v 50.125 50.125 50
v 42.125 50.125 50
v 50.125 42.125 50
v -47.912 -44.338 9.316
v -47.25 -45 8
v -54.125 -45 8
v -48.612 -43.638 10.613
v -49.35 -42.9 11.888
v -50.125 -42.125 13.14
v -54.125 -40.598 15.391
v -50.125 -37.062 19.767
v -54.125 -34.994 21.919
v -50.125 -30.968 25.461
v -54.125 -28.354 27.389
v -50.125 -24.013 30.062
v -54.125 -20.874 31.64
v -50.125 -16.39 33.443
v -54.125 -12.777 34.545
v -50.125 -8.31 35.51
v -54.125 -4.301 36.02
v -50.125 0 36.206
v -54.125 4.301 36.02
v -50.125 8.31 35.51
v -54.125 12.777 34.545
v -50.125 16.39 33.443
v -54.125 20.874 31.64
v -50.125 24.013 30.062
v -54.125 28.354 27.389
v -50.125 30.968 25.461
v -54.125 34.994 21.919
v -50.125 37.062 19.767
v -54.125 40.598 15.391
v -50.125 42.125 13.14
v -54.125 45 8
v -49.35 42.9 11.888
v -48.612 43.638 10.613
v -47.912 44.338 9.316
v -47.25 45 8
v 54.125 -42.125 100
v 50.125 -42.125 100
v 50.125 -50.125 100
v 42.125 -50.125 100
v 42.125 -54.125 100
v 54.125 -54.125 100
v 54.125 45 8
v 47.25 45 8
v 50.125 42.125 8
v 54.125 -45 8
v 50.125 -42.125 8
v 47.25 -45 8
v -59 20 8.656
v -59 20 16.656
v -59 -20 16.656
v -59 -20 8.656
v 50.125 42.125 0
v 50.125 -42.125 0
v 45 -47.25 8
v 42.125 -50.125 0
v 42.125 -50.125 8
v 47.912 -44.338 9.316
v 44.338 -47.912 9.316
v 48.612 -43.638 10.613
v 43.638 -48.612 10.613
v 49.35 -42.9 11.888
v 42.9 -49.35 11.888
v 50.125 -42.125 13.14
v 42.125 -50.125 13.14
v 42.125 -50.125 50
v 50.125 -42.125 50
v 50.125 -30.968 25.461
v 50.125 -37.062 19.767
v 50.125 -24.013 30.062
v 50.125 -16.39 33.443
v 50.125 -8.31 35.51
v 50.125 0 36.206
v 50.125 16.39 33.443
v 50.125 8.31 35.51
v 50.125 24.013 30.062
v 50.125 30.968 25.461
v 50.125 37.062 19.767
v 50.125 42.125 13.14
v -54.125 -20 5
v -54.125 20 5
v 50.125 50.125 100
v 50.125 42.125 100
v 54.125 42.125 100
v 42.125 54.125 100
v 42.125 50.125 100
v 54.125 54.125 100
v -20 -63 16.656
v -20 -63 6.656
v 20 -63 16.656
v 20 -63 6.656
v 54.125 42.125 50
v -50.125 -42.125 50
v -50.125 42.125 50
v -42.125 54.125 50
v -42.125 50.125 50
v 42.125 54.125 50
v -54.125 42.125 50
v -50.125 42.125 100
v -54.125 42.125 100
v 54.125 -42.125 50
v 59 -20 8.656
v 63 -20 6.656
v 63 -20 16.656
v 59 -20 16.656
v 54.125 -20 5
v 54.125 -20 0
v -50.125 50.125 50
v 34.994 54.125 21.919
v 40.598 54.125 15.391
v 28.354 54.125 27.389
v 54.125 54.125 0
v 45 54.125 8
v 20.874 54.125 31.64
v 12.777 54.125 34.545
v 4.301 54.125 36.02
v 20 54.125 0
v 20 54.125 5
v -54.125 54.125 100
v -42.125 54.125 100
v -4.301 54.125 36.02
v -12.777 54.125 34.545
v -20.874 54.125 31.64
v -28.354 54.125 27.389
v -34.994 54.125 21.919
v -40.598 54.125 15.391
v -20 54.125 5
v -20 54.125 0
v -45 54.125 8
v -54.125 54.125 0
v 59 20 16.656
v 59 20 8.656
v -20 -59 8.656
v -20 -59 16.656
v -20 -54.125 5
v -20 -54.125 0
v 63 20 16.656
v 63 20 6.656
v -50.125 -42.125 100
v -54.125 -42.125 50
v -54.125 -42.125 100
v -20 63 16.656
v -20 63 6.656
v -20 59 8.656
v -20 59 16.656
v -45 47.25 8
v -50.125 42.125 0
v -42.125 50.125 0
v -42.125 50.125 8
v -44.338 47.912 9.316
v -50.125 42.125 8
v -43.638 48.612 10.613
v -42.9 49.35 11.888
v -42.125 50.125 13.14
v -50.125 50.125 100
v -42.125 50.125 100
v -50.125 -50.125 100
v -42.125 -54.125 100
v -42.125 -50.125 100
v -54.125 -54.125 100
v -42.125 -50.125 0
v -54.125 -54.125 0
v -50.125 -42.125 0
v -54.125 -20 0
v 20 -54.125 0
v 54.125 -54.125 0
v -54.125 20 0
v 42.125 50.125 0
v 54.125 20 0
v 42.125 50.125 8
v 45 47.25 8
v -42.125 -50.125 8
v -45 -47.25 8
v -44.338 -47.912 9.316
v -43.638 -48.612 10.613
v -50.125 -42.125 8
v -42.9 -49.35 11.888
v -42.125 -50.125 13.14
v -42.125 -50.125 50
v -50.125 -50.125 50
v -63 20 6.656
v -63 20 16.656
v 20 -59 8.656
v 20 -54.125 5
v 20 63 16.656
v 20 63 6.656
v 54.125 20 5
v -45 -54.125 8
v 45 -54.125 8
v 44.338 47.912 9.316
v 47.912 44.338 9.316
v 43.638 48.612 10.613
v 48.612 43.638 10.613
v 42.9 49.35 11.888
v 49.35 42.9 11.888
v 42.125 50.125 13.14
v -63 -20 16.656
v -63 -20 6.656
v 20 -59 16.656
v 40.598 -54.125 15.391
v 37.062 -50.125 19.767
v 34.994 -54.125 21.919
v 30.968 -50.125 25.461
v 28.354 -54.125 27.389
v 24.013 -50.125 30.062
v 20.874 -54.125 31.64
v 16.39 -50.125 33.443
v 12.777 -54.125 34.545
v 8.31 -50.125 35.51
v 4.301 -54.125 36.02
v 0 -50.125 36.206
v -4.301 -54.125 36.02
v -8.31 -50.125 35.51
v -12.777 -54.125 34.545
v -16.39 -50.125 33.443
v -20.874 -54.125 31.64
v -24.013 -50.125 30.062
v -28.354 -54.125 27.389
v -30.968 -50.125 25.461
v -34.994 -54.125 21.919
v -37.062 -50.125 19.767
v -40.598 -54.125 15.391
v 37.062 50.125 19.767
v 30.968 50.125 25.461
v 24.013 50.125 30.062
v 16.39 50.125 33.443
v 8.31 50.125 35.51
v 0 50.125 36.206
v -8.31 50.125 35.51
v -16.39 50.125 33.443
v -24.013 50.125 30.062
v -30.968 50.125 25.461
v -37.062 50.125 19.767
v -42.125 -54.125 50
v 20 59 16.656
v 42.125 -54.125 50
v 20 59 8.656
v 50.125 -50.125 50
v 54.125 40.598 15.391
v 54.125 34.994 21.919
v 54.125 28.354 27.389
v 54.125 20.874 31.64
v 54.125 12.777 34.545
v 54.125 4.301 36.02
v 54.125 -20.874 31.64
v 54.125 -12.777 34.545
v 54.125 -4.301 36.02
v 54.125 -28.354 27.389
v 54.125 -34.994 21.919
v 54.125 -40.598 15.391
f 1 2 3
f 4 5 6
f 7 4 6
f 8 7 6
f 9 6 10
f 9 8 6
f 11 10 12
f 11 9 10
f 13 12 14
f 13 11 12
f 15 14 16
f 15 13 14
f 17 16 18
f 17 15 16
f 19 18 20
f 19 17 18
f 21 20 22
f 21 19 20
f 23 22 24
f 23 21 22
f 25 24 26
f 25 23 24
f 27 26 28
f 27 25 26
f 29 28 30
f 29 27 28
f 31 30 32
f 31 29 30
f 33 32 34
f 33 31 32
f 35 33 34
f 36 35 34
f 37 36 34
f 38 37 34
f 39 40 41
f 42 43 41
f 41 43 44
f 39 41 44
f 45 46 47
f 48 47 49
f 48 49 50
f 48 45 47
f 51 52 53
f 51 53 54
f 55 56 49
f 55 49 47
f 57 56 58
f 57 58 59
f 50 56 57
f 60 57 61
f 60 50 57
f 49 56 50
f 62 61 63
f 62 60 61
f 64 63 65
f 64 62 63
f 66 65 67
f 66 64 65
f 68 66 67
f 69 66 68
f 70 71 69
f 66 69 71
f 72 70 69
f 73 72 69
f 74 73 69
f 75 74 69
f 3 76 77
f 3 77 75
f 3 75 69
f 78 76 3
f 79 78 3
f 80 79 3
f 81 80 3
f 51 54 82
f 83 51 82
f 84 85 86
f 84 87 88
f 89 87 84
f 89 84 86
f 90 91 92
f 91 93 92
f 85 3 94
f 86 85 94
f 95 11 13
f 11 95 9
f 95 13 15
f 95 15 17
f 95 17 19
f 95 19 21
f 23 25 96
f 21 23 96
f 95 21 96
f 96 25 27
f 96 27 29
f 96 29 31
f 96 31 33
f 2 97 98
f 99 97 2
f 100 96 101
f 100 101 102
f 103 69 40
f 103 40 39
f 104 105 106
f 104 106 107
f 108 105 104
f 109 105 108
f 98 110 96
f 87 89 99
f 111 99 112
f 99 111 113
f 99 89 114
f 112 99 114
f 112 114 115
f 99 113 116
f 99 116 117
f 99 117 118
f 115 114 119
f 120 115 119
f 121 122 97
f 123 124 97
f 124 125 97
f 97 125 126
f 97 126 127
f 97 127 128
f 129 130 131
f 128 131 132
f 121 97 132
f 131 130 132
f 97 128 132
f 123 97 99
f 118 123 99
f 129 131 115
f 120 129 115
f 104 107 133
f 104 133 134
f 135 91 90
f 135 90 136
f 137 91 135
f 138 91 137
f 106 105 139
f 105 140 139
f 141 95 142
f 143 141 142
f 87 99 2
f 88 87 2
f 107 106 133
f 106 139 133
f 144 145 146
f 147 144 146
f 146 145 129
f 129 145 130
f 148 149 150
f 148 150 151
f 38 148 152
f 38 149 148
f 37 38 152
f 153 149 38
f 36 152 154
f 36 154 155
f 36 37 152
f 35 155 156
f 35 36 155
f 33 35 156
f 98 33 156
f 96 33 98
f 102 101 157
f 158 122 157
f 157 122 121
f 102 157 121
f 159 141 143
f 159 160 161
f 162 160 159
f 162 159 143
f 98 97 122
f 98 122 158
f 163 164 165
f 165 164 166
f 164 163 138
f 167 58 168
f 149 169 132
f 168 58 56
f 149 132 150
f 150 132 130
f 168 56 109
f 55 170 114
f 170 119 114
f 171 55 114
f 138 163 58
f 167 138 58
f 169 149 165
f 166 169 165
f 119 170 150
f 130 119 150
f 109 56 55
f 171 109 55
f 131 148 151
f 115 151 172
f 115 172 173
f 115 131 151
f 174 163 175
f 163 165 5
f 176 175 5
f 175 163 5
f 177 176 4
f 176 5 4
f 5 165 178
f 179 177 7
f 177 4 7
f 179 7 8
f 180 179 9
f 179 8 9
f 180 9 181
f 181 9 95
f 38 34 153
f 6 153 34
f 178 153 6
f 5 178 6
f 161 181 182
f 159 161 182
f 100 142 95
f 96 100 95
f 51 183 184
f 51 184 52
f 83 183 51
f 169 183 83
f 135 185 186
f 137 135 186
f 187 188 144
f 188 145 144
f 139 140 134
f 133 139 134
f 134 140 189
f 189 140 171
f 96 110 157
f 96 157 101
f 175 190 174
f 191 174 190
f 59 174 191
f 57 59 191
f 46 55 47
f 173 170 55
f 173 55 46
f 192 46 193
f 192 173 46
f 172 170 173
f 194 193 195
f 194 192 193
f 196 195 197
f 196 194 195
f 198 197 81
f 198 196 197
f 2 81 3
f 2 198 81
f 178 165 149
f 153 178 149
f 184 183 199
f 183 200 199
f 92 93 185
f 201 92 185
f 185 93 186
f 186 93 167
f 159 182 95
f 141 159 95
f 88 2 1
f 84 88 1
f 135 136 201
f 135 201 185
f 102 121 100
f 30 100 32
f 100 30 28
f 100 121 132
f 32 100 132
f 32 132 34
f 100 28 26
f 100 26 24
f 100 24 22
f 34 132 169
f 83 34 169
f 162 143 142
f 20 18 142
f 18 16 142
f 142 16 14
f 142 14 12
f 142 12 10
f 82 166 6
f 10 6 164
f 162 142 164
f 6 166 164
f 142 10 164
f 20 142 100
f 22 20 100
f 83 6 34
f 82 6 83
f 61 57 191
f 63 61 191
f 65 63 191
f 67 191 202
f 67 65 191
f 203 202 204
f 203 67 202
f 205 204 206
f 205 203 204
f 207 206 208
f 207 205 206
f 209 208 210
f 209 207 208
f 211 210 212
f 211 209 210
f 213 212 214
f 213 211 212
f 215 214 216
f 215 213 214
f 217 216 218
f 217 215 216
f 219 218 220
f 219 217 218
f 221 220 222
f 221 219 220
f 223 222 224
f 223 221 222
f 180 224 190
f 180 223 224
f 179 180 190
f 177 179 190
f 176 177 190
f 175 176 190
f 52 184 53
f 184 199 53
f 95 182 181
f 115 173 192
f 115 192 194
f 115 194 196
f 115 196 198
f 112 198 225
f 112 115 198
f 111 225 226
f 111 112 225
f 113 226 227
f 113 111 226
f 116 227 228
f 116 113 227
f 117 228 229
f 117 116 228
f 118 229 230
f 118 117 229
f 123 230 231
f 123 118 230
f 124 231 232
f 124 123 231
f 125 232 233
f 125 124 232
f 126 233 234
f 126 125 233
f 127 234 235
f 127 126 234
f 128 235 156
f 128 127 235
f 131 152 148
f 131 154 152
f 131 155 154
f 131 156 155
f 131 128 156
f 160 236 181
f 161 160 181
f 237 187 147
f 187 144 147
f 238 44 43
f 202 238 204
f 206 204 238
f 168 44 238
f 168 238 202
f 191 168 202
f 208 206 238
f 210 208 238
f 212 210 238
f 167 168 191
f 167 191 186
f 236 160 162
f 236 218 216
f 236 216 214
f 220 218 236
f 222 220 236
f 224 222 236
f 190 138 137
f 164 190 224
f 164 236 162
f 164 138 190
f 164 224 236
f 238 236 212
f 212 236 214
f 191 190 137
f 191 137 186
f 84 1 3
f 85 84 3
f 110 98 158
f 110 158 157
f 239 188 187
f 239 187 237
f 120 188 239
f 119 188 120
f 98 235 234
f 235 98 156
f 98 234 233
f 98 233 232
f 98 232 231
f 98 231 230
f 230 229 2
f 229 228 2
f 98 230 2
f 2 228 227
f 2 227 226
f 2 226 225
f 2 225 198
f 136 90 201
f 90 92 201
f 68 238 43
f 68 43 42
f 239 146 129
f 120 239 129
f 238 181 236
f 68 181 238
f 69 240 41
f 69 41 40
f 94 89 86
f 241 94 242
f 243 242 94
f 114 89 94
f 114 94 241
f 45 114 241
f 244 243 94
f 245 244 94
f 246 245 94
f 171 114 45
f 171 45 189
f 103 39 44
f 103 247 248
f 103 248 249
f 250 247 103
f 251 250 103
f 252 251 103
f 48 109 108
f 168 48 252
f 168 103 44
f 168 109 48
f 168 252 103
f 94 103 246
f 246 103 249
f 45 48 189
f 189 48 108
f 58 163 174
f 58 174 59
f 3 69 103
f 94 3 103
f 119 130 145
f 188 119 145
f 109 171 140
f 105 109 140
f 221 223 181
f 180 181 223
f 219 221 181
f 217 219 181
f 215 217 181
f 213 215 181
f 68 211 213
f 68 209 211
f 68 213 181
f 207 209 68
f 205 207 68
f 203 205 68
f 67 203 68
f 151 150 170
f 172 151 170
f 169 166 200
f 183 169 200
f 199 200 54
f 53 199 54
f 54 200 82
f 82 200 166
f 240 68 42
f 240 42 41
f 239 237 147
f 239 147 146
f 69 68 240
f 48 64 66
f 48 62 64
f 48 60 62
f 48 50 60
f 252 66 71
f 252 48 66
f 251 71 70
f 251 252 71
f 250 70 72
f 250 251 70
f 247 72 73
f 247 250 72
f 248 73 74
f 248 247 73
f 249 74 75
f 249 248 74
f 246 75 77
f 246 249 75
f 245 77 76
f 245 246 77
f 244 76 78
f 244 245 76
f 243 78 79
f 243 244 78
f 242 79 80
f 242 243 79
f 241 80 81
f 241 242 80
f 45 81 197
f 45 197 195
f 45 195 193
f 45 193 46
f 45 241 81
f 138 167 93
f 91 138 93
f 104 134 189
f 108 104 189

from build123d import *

# Parameters (mm, degrees)
SKETCH1_W                                    = 108.25
SKETCH1_H                                    = 108.25
SKETCH1_W_2                                  = 100.25
SKETCH1_H_2                                  = 100.25
BASE_DEPTH                                   = 50
CHAMFER_2_SIZE                               = 8
WALL_BRACE_DEPTH                             = 20
WALL_BRACE_PATTERN_COUNT                     = 4
LATTICE_SUPPORT_ARM_DEPTH                    = 50
LATTICE_SUPPORT_ARM_MIRROR_AT_THE_SE_3_DEPTH = 50
ARCHES_1_REACH                               = 168.395
ARCHES_2_REACH                               = 168.395


with BuildPart() as part:
    # Sketch1 → Base (new body)
    with BuildSketch(Plane.XY):
        Rectangle(SKETCH1_W, SKETCH1_H)
        Rectangle(SKETCH1_W_2, SKETCH1_H_2, mode=Mode.SUBTRACT)
    extrude(amount=BASE_DEPTH)

    # Chamfer 2
    chamfer_2_edges = [part.edges().sort_by_distance(p)[0] for p in [
        (50.125, -50.125, 25),
        (50.125, 50.125, 25),
        (-50.125, 50.125, 25),
        (-50.125, -50.125, 25),
    ]]
    chamfer(chamfer_2_edges, length=CHAMFER_2_SIZE)

    # Sketch3 → Wall-Brace (add, symmetric)
    with BuildSketch(Plane(origin=(0, 0, 0), x_dir=(1, 0, 0), z_dir=(0, 1, 0))):
        Polygon((54.125, 0), (63, -6.65625), (63, -16.65625), (59, -16.65625), (59, -8.65625), (54.125, -5), align=None)
    wall_brace = extrude(amount=WALL_BRACE_DEPTH, both=True)

    # Wall-Brace-Pattern: Wall-Brace ×4 about axis
    wall_brace_pattern_axis = Axis((0, 0, 0), (0, 0, 1))
    for i in range(1, WALL_BRACE_PATTERN_COUNT):
        add(wall_brace.rotate(wall_brace_pattern_axis, i * 360 / WALL_BRACE_PATTERN_COUNT))

    # Sketch4 → Lattice-Support-Arm (add)
    with BuildSketch(Plane.XY.offset(50)):
        Polygon((-50.125, 42.125), (-54.125, 42.125), (-54.125, 54.125), (-42.125, 54.125), (-42.125, 50.125), (-50.125, 50.125), align=None)
    lattice_support_arm = extrude(amount=LATTICE_SUPPORT_ARM_DEPTH)

    # Lattice-Support-Arm-Mirror: Lattice-Support-Arm across plane
    add(lattice_support_arm.mirror(Plane(origin=(0, 0, 0), x_dir=(0, 0, 1), z_dir=(1, 0, 0))))

    # Lattice-Support-Arm-Mirror at the second: Lattice-Support-Arm across plane
    add(lattice_support_arm.mirror(Plane.ZX))

    # Lattice-Support-Arm-Mirror at the se 2 → Lattice-Support-Arm-Mirror at the se 3 (add)
    with BuildSketch(Plane(origin=(0, 0, 50), x_dir=(-1, 0, 0), z_dir=(0, 0, 1))):
        Polygon((-50.125, 42.125), (-54.125, 42.125), (-54.125, 54.125), (-42.125, 54.125), (-42.125, 50.125), (-50.125, 50.125), align=None)
    extrude(amount=LATTICE_SUPPORT_ARM_MIRROR_AT_THE_SE_3_DEPTH)

    # Arches-1: up to this face of the body (flat: up to its plane)
    arches_1_end = Plane(part.part.faces().sort_by_distance((-54.125, 0, 35.058479532))[0])
    # Sketch5 → Arches-1 (cut, up to the picked face)
    with BuildSketch(Plane.ZY.offset(-54.125), mode=Mode.PRIVATE) as arches_1_sk1:
        with BuildLine():
            Line((8, 45), (8, -45))
            ThreePointArc((8, -45), (36.205505282, 0), (8, 45))
        make_face()
    arches_1_tool1 = split(extrude(arches_1_sk1.sketch, amount=ARCHES_1_REACH, mode=Mode.PRIVATE), bisect_by=arches_1_end, keep=Keep.BOTH, mode=Mode.PRIVATE)
    add(arches_1_tool1.solids().sort_by(Axis((54.125, 0, 19.609008), (-1, 0, 0)))[0], mode=Mode.SUBTRACT)

    # Arches-2: up to this face of the body (flat: up to its plane)
    arches_2_end = Plane(part.part.faces().sort_by_distance((0, -54.125, 35.058479532))[0])
    # Sketch6 → Arches-2 (cut, up to the picked face)
    with BuildSketch(Plane(origin=(0, 54.125, 0), x_dir=(1, 0, 0), z_dir=(0, 1, 0)), mode=Mode.PRIVATE) as arches_2_sk1:
        with BuildLine():
            Line((-45, -8), (45, -8))
            ThreePointArc((45, -8), (0, -36.205505282), (-45, -8))
        make_face()
    arches_2_tool1 = split(extrude(arches_2_sk1.sketch, amount=-ARCHES_2_REACH, mode=Mode.PRIVATE), bisect_by=arches_2_end, keep=Keep.BOTH, mode=Mode.PRIVATE)
    add(arches_2_tool1.solids().sort_by(Axis((0, 54.125, 19.609008), (0, -1, 0)))[0], mode=Mode.SUBTRACT)


solid = part.part
